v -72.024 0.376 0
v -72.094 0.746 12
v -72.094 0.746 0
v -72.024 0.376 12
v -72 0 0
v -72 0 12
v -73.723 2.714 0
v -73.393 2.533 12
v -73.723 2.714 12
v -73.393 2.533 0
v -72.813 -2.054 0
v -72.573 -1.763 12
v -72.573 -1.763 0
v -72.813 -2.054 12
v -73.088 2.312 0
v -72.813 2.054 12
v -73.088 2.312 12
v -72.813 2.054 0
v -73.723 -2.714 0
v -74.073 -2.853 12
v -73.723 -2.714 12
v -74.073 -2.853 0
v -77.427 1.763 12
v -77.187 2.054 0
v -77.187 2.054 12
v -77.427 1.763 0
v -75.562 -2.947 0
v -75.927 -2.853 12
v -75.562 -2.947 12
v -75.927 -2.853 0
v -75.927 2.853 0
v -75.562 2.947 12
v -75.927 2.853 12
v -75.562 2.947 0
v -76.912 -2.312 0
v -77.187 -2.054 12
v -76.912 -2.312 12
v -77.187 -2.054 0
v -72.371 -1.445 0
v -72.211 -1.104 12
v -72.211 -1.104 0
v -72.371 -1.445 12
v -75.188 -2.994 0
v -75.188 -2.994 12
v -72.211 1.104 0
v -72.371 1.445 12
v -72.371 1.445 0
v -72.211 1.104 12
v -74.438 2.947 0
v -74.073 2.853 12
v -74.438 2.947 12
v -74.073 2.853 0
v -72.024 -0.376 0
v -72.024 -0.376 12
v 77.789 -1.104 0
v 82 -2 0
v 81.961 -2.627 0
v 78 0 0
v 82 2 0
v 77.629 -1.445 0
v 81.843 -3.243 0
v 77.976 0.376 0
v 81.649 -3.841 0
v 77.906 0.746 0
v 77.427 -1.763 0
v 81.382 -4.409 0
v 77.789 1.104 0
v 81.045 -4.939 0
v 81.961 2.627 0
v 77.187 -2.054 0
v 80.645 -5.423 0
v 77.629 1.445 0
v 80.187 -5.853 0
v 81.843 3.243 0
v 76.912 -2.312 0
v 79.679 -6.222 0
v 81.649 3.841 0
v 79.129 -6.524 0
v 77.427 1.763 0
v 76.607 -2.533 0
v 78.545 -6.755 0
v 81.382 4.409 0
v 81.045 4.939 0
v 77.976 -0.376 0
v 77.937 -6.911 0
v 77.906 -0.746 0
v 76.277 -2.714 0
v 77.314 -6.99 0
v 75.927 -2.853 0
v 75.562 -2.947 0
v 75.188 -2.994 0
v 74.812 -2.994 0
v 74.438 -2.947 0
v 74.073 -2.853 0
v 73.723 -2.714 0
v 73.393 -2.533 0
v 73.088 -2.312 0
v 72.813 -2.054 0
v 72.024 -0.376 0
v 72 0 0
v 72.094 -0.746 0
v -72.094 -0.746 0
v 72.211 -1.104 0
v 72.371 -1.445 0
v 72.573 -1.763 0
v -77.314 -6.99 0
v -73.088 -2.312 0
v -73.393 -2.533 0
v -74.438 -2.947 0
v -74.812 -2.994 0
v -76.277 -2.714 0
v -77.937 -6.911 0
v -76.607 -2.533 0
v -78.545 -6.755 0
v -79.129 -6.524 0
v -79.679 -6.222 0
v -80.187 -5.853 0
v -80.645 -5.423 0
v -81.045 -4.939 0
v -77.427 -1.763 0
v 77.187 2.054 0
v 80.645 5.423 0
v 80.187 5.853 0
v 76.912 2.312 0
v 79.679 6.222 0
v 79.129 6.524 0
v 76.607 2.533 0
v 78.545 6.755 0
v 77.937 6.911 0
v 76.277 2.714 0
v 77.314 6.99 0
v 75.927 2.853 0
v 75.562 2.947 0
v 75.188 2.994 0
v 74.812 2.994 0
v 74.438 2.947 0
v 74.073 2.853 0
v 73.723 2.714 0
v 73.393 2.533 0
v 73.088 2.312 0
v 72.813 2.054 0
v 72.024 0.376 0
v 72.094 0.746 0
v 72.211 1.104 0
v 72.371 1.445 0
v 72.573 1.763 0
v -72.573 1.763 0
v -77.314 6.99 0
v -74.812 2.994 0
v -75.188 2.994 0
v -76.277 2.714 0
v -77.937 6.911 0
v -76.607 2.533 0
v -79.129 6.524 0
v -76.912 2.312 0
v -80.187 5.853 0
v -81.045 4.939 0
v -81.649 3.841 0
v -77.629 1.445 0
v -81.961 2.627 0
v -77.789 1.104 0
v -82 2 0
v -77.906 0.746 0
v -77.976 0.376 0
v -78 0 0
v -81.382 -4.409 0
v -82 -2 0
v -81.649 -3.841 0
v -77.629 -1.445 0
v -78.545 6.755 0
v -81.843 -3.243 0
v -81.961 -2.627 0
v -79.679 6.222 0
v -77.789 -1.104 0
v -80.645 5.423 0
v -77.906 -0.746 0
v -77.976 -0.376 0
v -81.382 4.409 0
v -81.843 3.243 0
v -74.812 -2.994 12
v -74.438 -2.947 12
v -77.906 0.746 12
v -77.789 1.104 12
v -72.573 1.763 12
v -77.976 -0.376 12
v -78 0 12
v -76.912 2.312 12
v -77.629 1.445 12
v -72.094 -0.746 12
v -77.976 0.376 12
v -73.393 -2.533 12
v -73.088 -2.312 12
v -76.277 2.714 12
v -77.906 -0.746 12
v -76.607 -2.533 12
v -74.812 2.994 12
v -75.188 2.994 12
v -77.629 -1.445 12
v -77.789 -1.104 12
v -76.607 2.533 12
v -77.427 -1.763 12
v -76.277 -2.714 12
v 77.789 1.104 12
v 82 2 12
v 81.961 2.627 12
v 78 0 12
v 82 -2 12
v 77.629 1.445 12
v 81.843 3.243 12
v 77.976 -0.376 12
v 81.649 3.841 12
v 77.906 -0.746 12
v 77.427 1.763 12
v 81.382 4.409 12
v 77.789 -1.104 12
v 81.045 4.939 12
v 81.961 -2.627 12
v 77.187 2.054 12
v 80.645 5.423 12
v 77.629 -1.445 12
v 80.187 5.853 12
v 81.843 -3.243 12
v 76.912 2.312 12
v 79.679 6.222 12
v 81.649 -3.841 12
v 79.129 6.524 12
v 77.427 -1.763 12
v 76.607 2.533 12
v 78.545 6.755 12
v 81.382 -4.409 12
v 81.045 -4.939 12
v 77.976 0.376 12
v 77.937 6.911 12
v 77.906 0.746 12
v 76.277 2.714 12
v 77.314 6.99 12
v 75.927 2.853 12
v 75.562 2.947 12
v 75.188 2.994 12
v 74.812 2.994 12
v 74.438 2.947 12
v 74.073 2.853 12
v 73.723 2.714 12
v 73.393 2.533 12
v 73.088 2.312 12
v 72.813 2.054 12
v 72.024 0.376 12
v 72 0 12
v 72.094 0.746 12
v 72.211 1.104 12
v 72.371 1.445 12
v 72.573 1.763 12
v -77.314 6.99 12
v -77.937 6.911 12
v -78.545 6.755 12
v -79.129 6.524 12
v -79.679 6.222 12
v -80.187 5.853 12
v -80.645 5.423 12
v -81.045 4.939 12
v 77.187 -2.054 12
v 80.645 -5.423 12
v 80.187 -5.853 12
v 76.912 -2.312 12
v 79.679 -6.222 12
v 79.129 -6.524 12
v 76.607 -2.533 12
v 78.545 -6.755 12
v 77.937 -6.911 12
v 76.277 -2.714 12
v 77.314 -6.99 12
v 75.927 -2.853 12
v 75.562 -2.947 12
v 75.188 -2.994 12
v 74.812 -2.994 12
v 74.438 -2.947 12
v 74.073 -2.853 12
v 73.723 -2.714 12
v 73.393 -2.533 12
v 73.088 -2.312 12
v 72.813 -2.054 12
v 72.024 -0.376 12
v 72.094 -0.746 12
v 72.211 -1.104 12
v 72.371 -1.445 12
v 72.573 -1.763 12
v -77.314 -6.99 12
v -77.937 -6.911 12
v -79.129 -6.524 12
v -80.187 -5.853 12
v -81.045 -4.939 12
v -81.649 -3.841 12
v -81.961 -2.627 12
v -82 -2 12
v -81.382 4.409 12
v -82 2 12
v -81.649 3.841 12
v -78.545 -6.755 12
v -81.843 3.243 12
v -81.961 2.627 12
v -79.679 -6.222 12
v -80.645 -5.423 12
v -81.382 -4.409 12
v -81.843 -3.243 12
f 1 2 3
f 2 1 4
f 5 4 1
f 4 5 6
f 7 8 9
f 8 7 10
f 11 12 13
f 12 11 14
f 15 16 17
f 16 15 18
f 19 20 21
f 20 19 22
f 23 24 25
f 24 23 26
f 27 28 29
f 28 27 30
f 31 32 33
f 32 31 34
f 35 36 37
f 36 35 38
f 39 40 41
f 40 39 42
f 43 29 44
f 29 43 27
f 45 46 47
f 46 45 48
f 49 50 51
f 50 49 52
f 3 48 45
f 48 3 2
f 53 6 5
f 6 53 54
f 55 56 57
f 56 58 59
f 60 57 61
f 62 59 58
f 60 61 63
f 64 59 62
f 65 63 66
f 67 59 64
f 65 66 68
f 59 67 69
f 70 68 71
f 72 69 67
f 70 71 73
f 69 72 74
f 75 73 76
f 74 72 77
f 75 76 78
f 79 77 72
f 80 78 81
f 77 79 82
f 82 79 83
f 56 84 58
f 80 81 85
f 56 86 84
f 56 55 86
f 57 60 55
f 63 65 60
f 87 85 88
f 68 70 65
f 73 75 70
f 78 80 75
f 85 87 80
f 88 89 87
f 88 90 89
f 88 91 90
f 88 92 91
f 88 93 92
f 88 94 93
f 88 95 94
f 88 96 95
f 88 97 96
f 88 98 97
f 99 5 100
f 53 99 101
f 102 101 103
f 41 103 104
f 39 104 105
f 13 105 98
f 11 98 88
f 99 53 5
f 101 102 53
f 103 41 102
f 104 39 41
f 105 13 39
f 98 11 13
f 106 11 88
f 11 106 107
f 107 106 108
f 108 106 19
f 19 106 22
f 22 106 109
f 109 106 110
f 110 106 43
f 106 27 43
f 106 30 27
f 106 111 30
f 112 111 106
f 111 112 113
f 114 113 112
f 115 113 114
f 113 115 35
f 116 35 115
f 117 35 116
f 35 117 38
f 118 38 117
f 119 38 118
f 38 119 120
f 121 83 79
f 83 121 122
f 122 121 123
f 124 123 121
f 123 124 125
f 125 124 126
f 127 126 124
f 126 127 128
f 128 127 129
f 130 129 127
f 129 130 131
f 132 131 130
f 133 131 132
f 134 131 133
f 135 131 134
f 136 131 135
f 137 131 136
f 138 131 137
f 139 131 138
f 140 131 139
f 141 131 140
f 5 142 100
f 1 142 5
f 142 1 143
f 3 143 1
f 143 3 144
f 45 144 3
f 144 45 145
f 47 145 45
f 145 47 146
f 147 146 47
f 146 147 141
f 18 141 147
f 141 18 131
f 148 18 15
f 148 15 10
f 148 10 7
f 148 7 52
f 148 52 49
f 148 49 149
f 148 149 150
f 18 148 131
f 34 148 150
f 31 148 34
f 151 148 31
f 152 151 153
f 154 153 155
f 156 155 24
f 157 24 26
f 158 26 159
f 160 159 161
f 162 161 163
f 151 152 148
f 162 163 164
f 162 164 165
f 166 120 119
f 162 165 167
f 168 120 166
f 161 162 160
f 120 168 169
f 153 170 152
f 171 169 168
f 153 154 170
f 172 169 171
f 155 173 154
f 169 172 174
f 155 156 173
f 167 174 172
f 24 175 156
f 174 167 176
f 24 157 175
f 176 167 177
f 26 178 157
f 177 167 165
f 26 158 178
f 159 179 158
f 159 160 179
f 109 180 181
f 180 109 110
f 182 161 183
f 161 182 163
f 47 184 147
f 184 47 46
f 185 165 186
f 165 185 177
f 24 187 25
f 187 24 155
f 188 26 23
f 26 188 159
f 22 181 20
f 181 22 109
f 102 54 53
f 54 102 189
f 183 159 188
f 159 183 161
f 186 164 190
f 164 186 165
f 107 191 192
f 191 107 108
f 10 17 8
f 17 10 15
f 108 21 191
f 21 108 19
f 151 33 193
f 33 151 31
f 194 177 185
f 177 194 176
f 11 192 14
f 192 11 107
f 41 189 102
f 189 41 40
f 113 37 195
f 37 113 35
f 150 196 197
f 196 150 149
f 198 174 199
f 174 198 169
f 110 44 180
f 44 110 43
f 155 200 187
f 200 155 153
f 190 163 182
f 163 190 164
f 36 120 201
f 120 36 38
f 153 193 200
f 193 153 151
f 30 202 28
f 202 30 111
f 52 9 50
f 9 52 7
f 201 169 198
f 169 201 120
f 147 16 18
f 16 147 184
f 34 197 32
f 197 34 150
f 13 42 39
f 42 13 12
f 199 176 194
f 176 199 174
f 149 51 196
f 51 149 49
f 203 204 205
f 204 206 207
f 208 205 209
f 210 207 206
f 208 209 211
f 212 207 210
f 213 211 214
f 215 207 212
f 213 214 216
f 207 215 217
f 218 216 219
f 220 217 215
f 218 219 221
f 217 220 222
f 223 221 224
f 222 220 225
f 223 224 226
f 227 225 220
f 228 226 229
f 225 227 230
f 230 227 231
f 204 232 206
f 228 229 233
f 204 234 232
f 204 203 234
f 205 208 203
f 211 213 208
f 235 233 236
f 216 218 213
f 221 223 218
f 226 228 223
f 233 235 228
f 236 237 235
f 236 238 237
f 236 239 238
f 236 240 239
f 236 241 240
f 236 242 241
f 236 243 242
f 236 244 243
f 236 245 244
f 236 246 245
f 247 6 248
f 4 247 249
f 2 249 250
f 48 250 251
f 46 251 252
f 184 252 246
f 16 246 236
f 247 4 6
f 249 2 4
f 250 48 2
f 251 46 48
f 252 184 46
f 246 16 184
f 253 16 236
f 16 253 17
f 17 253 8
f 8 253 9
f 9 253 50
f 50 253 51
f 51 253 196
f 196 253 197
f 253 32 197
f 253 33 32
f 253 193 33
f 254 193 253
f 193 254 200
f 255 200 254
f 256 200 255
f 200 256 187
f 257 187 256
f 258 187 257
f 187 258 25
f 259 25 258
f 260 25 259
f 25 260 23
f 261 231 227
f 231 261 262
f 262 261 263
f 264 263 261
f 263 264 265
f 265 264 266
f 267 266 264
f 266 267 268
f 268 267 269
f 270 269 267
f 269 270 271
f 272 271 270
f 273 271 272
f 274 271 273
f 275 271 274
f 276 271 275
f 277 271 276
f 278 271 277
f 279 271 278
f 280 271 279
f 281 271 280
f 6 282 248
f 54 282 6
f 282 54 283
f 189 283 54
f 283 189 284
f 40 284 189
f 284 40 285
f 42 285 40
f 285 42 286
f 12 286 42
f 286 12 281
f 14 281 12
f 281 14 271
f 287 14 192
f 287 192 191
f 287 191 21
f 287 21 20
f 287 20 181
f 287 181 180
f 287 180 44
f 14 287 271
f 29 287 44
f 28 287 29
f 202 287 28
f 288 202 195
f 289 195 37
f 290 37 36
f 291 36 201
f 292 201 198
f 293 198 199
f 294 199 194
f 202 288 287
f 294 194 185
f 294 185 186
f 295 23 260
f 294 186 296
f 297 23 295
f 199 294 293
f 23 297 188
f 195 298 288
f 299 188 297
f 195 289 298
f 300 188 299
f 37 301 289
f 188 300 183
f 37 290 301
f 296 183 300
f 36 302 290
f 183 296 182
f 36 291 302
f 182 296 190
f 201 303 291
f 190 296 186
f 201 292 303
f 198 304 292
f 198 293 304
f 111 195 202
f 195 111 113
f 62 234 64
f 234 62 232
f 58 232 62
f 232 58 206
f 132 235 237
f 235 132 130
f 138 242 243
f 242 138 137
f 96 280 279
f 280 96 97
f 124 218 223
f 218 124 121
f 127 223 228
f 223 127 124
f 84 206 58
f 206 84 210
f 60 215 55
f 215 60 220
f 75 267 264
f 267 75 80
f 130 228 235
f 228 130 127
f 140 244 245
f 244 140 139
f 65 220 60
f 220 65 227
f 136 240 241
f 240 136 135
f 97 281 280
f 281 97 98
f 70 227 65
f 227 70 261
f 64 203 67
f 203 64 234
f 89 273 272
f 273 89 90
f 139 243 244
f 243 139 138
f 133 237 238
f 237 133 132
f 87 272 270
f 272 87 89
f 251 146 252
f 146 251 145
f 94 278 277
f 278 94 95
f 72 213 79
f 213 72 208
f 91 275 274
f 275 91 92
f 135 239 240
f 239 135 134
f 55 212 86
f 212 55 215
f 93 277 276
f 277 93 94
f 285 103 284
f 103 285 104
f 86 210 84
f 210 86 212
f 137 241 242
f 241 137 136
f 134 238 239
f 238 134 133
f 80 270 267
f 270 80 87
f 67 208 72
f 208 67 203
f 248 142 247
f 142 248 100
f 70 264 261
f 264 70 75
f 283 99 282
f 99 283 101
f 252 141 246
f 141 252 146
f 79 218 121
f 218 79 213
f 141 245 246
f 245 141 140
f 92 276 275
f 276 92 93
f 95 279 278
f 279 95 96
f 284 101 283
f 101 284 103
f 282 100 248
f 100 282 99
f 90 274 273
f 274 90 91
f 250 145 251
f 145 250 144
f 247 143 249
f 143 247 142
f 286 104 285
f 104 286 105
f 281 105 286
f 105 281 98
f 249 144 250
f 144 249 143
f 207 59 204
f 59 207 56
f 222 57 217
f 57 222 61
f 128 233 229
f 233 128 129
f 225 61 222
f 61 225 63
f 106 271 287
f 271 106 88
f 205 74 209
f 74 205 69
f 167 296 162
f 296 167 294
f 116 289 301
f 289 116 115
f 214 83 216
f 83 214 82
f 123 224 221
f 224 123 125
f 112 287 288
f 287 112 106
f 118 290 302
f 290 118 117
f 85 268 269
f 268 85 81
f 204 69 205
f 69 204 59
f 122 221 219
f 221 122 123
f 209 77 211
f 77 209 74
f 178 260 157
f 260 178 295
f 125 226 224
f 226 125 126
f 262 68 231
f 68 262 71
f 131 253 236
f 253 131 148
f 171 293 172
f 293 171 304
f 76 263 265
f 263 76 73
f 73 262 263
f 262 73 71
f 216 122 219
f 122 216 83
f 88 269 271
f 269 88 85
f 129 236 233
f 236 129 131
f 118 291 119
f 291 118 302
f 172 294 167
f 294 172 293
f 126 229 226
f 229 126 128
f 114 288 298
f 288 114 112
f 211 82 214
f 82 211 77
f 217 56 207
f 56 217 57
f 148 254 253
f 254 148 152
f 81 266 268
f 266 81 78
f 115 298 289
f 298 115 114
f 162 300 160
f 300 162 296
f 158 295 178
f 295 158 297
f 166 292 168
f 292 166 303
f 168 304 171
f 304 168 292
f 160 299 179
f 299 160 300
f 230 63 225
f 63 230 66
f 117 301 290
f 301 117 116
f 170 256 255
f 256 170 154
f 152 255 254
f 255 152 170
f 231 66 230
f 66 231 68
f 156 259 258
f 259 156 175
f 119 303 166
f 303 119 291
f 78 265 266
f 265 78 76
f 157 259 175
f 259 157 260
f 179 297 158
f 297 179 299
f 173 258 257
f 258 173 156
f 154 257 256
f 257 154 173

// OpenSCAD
$fn = 50;


difference() {
	union() {
		hull() {
			translate(v = [-77.0000000000, 2.0000000000, 0]) {
				cylinder(h = 12, r = 5);
			}
			translate(v = [77.0000000000, 2.0000000000, 0]) {
				cylinder(h = 12, r = 5);
			}
			translate(v = [-77.0000000000, -2.0000000000, 0]) {
				cylinder(h = 12, r = 5);
			}
			translate(v = [77.0000000000, -2.0000000000, 0]) {
				cylinder(h = 12, r = 5);
			}
		}
	}
	union() {
		translate(v = [-75.0000000000, 0.0000000000, 0]) {
			cylinder(h = 12, r = 3.0000000000);
		}
		translate(v = [75.0000000000, 0.0000000000, 0]) {
			cylinder(h = 12, r = 3.0000000000);
		}
		translate(v = [-75.0000000000, 0.0000000000, 0]) {
			cylinder(h = 12, r = 1.5000000000);
		}
		translate(v = [75.0000000000, 0.0000000000, 0]) {
			cylinder(h = 12, r = 1.5000000000);
		}
		translate(v = [-75.0000000000, 0.0000000000, 0]) {
			cylinder(h = 12, r = 1.5000000000);
		}
		translate(v = [75.0000000000, 0.0000000000, 0]) {
			cylinder(h = 12, r = 1.5000000000);
		}
		translate(v = [-75.0000000000, 0.0000000000, 0]) {
			cylinder(h = 12, r = 1.5000000000);
		}
		translate(v = [75.0000000000, 0.0000000000, 0]) {
			cylinder(h = 12, r = 1.5000000000);
		}
	}
}
